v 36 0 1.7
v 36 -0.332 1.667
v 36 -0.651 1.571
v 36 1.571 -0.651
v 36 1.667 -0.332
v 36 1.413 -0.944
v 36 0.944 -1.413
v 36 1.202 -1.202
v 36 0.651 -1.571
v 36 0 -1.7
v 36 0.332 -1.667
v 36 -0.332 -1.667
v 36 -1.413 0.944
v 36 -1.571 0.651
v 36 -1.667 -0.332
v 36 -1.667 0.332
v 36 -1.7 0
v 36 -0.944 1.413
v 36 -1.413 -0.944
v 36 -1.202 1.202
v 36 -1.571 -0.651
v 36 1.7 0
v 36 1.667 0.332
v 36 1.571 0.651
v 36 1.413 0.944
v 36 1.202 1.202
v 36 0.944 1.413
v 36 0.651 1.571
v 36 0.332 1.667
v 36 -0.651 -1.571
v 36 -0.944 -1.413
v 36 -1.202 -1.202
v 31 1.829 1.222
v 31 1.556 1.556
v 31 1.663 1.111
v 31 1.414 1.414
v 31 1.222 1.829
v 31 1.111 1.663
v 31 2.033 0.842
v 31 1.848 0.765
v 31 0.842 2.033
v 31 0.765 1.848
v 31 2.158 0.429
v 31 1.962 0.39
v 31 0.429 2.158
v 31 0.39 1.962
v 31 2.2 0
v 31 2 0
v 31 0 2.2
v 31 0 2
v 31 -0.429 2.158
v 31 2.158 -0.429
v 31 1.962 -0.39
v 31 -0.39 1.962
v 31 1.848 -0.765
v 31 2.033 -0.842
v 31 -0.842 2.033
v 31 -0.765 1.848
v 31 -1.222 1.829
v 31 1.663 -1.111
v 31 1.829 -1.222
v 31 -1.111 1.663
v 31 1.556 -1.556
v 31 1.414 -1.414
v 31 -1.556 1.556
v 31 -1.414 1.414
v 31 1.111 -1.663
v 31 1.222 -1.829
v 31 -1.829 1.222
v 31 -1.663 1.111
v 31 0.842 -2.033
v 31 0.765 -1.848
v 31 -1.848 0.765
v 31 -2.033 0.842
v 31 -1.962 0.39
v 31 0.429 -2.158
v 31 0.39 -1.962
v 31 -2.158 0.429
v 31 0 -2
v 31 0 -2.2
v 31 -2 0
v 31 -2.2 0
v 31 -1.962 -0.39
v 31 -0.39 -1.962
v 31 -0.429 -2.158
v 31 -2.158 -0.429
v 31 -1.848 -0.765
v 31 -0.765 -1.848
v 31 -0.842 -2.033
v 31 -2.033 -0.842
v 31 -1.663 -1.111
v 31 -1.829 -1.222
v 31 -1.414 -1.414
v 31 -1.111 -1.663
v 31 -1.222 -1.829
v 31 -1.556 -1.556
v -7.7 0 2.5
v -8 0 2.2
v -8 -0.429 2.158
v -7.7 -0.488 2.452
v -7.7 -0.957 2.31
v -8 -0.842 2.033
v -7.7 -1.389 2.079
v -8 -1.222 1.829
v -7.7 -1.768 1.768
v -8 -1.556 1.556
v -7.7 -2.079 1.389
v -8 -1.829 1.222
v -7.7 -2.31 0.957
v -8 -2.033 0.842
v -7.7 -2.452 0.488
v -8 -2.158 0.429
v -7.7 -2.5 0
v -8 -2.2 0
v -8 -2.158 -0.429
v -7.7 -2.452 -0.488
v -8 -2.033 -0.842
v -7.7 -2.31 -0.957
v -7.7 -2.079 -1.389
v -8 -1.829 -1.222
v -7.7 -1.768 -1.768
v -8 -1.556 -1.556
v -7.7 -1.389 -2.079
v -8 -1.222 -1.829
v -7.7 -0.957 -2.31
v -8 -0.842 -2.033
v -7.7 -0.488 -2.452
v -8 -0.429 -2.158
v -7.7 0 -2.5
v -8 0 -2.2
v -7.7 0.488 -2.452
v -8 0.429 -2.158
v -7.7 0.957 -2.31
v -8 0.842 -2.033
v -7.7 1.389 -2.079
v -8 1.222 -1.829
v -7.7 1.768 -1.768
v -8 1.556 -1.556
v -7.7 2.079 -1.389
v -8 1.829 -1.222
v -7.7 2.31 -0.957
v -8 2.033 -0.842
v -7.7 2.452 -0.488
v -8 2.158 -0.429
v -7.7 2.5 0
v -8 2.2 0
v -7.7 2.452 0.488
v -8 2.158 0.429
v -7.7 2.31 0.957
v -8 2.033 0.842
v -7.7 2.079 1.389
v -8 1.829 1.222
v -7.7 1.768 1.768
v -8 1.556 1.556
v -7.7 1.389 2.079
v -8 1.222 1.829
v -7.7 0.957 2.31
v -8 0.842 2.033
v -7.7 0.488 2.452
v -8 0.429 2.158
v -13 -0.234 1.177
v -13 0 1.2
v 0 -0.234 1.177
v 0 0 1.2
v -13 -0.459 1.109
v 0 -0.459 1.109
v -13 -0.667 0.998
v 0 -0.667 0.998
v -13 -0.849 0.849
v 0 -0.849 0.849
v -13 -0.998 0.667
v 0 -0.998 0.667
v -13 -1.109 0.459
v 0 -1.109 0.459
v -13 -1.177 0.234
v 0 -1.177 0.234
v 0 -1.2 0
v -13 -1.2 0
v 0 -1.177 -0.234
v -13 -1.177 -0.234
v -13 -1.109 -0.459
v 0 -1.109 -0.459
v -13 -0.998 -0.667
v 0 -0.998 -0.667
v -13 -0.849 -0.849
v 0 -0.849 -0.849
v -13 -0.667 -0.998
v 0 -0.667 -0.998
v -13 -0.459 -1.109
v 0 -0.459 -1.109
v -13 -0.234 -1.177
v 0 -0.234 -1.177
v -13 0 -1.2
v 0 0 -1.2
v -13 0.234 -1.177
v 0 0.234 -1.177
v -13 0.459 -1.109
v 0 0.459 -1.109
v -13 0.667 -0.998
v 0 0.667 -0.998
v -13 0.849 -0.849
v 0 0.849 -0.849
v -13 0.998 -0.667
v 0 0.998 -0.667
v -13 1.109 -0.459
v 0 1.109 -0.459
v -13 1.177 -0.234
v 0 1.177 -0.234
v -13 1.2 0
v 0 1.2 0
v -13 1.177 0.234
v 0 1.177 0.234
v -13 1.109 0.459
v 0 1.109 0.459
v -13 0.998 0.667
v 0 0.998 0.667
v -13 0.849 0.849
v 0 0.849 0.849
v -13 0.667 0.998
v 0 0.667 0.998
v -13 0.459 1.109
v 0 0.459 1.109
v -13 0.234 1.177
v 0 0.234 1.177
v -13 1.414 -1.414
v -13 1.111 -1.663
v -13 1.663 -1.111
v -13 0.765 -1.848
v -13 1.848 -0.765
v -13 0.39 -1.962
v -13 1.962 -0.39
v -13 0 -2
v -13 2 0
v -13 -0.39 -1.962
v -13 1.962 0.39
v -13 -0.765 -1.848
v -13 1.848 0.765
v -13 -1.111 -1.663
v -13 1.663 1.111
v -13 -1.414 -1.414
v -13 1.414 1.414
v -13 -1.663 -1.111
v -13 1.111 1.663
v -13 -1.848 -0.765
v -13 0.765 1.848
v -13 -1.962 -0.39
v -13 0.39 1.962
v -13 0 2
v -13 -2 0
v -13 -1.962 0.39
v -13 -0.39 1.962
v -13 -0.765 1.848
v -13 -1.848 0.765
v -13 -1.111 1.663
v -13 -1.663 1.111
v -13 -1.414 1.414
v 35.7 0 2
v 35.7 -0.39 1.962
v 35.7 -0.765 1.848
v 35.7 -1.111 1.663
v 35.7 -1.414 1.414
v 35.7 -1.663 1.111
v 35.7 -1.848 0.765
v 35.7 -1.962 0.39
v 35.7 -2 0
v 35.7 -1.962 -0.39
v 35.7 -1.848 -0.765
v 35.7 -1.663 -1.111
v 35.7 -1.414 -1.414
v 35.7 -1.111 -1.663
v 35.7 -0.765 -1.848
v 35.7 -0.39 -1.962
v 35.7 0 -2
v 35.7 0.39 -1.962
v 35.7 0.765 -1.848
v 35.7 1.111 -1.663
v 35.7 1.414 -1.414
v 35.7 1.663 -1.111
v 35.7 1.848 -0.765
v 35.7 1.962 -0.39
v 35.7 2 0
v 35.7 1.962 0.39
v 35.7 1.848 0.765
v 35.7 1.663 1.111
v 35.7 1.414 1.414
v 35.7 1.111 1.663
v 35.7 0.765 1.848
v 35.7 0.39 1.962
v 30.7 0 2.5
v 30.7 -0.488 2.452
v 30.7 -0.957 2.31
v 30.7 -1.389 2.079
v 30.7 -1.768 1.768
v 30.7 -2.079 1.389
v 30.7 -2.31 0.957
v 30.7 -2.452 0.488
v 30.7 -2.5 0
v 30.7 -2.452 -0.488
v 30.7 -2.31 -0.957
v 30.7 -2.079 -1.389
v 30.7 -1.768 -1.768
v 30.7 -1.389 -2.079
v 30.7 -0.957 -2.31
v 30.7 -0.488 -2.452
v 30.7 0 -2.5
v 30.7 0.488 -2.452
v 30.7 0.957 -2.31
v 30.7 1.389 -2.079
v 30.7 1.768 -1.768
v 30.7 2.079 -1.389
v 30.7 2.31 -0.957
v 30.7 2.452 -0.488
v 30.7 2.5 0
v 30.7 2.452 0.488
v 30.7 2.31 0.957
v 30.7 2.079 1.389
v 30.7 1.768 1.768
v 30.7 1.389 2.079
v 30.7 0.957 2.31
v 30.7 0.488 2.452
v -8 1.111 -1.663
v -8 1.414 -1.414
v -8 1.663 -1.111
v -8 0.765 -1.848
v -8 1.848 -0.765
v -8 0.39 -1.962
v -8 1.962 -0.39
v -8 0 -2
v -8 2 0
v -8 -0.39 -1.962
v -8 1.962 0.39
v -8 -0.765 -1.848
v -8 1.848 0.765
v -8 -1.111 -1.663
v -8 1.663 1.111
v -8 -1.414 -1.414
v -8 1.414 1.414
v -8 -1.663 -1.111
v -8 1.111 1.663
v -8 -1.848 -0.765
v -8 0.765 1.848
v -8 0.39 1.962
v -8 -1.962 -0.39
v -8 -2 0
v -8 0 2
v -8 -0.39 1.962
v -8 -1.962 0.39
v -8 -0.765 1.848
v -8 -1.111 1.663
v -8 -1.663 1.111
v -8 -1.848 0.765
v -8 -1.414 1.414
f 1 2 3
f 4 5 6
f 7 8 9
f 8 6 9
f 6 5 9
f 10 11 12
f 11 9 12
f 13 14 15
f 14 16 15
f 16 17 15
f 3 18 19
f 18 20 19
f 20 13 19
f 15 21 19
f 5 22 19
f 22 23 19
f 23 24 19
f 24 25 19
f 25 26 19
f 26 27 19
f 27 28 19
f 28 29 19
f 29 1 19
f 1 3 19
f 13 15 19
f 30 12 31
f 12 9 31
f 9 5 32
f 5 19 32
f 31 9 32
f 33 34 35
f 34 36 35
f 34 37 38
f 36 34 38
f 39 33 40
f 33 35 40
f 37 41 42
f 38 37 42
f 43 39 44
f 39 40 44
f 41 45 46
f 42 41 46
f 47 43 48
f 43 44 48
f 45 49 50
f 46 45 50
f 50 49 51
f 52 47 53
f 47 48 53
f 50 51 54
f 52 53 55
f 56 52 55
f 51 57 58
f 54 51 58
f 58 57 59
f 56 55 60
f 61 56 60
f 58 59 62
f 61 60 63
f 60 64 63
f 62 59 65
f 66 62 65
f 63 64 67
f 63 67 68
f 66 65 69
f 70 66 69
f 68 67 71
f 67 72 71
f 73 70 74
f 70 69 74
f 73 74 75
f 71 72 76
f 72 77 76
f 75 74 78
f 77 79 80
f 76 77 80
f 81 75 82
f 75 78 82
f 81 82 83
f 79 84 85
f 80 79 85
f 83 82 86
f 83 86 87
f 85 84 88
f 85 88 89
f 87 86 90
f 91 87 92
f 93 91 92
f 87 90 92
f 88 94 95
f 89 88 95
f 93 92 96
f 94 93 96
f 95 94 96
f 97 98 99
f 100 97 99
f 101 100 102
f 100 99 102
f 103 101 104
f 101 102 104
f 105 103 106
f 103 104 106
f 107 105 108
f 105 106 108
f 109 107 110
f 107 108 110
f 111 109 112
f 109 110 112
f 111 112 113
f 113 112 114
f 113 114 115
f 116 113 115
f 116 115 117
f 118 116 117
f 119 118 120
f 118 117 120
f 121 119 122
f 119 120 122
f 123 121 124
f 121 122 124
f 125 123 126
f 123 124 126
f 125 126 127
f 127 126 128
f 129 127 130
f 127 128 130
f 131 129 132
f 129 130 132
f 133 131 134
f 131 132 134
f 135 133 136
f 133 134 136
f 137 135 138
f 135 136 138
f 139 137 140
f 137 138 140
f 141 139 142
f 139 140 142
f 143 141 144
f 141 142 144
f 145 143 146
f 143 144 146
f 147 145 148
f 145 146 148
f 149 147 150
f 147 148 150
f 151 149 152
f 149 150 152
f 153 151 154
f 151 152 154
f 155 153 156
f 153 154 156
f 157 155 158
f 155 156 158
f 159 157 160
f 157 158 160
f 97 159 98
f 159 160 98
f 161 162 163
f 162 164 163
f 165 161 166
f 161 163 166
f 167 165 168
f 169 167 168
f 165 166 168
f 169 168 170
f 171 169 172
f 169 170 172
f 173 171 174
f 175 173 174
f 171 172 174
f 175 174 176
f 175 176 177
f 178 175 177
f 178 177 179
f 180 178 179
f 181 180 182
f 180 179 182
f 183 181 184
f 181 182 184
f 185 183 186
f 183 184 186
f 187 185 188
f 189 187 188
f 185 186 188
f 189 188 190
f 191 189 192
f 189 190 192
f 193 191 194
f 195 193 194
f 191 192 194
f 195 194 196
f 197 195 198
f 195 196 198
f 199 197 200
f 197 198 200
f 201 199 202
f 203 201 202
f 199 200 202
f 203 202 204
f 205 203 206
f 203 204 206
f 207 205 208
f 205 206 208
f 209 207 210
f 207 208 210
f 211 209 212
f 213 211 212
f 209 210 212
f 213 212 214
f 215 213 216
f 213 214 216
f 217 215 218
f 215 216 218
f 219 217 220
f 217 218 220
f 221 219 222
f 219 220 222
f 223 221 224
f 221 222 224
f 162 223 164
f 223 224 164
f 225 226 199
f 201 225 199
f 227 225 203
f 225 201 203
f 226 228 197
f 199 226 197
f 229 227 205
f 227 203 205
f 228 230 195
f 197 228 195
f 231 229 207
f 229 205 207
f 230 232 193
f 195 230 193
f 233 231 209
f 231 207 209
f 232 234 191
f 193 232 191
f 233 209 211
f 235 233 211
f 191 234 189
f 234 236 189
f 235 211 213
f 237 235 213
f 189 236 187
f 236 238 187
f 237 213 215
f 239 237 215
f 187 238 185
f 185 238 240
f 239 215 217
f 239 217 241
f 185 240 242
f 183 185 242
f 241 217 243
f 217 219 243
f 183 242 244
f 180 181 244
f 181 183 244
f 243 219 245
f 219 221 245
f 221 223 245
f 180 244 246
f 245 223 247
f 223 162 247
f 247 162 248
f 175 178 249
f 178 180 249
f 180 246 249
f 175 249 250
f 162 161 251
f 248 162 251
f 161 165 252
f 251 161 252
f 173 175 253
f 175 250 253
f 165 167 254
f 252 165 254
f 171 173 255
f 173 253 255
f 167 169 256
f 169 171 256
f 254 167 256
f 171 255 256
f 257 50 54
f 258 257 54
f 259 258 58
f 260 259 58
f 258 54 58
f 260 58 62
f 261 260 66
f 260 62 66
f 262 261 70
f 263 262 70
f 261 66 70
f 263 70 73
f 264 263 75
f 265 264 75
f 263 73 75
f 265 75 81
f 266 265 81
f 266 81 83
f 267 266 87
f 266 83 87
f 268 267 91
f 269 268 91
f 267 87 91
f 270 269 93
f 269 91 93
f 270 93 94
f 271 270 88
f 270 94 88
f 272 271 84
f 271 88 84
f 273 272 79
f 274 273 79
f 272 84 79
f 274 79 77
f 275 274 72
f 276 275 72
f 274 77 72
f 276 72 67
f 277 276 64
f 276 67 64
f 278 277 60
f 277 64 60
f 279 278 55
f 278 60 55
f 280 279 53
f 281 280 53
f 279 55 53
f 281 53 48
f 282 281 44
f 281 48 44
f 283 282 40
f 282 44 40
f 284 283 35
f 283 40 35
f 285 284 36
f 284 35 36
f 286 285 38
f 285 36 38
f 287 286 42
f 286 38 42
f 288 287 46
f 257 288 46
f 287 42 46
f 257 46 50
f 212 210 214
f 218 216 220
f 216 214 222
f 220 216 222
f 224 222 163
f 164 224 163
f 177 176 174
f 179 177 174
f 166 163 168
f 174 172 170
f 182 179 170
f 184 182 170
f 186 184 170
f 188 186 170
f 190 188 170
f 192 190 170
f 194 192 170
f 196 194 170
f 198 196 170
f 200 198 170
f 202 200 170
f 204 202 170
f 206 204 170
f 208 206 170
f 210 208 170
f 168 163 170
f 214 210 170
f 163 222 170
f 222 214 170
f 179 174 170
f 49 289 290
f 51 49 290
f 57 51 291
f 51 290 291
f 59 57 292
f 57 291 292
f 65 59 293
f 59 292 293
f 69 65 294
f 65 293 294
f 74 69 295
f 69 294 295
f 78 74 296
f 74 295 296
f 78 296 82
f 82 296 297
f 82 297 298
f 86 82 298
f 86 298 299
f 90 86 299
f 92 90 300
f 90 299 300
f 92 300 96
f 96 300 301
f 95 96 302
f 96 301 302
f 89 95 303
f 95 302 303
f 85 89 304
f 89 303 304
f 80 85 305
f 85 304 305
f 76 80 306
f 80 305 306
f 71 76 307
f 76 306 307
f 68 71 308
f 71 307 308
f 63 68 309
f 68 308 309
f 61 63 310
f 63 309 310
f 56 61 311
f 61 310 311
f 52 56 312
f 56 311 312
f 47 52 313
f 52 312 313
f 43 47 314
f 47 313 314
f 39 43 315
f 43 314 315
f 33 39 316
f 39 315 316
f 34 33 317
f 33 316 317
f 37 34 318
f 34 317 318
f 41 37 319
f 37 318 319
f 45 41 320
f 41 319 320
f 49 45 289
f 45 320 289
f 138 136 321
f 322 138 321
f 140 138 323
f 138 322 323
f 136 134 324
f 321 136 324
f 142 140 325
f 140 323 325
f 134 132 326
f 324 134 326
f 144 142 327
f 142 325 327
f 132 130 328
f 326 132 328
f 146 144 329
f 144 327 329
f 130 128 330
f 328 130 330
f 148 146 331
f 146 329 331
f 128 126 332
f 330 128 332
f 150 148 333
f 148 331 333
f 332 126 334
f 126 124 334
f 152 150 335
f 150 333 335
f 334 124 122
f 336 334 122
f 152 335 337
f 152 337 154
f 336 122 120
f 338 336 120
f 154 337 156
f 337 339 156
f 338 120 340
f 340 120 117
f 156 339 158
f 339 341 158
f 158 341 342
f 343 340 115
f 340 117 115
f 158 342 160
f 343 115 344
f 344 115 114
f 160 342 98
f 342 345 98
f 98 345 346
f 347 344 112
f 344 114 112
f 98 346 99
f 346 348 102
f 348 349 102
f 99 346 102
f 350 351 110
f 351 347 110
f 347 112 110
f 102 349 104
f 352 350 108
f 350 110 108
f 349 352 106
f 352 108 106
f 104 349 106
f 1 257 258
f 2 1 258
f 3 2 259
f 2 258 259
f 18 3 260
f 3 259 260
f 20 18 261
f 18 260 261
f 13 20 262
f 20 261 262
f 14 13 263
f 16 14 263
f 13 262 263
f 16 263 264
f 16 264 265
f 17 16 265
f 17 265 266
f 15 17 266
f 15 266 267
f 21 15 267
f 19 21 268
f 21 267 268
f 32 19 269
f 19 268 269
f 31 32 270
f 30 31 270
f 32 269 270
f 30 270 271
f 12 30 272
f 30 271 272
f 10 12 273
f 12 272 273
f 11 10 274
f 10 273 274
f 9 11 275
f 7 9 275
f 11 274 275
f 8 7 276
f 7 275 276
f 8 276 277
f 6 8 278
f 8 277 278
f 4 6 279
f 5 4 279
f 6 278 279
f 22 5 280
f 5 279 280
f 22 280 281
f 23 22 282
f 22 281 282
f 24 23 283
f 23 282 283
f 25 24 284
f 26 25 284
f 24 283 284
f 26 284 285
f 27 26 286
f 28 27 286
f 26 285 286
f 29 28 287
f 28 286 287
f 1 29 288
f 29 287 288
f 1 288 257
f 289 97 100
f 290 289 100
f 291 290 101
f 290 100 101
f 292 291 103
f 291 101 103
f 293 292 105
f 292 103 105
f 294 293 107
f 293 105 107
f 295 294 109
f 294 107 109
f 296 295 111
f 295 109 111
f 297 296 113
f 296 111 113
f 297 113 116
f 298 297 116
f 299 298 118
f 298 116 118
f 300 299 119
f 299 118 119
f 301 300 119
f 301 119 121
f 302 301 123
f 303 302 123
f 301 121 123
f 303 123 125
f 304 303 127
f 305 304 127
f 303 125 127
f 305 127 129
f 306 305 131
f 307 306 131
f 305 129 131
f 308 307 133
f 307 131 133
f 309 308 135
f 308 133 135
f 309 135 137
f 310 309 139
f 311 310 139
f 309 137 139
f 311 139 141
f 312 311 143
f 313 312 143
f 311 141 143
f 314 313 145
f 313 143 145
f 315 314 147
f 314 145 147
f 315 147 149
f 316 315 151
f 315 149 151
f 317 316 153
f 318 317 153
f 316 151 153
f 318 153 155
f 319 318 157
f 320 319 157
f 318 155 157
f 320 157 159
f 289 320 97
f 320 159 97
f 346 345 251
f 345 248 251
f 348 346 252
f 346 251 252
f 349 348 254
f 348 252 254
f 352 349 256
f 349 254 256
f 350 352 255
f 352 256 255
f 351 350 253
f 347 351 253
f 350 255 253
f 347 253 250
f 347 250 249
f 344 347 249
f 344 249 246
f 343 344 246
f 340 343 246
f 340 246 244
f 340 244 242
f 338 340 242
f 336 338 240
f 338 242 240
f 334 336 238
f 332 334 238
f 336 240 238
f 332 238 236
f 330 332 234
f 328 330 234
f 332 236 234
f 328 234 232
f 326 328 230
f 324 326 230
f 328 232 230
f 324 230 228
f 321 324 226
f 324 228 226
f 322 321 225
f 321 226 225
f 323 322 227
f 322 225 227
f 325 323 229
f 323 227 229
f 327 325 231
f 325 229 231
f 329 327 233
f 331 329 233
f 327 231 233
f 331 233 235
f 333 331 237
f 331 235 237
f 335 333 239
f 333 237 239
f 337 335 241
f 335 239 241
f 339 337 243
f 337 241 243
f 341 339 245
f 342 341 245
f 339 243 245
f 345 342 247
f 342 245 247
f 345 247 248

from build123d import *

# Parameters (mm, degrees)
CHANFREIN1_SIZE = 0.3


with BuildPart() as part:
    # Esquisse1 → Révolution1 (revolve)
    with BuildSketch(Plane.XY, mode=Mode.PRIVATE) as r_volution1_sk:
        Polygon((36, 0), (36, 2), (31, 2), (31, 2.5), (-8, 2.5), (-8, 2), (-13, 2), (-13, 1.2), (0, 1.2), (0, 0), align=None)
    revolve(r_volution1_sk.sketch.rotate(Axis((-77.893994415, 0, 0), (1, 0, 0)), 90), axis=Axis((-77.893994415, 0, 0), (1, 0, 0)))

    # Chanfrein1
    chanfrein1_edges = [part.edges().sort_by_distance(p)[0] for p in [
        (36, 0, -2),
        (-8, 0, -2.5),
        (31, 0, -2.5),
    ]]
    chamfer(chanfrein1_edges, length=CHANFREIN1_SIZE)


solid = part.part
